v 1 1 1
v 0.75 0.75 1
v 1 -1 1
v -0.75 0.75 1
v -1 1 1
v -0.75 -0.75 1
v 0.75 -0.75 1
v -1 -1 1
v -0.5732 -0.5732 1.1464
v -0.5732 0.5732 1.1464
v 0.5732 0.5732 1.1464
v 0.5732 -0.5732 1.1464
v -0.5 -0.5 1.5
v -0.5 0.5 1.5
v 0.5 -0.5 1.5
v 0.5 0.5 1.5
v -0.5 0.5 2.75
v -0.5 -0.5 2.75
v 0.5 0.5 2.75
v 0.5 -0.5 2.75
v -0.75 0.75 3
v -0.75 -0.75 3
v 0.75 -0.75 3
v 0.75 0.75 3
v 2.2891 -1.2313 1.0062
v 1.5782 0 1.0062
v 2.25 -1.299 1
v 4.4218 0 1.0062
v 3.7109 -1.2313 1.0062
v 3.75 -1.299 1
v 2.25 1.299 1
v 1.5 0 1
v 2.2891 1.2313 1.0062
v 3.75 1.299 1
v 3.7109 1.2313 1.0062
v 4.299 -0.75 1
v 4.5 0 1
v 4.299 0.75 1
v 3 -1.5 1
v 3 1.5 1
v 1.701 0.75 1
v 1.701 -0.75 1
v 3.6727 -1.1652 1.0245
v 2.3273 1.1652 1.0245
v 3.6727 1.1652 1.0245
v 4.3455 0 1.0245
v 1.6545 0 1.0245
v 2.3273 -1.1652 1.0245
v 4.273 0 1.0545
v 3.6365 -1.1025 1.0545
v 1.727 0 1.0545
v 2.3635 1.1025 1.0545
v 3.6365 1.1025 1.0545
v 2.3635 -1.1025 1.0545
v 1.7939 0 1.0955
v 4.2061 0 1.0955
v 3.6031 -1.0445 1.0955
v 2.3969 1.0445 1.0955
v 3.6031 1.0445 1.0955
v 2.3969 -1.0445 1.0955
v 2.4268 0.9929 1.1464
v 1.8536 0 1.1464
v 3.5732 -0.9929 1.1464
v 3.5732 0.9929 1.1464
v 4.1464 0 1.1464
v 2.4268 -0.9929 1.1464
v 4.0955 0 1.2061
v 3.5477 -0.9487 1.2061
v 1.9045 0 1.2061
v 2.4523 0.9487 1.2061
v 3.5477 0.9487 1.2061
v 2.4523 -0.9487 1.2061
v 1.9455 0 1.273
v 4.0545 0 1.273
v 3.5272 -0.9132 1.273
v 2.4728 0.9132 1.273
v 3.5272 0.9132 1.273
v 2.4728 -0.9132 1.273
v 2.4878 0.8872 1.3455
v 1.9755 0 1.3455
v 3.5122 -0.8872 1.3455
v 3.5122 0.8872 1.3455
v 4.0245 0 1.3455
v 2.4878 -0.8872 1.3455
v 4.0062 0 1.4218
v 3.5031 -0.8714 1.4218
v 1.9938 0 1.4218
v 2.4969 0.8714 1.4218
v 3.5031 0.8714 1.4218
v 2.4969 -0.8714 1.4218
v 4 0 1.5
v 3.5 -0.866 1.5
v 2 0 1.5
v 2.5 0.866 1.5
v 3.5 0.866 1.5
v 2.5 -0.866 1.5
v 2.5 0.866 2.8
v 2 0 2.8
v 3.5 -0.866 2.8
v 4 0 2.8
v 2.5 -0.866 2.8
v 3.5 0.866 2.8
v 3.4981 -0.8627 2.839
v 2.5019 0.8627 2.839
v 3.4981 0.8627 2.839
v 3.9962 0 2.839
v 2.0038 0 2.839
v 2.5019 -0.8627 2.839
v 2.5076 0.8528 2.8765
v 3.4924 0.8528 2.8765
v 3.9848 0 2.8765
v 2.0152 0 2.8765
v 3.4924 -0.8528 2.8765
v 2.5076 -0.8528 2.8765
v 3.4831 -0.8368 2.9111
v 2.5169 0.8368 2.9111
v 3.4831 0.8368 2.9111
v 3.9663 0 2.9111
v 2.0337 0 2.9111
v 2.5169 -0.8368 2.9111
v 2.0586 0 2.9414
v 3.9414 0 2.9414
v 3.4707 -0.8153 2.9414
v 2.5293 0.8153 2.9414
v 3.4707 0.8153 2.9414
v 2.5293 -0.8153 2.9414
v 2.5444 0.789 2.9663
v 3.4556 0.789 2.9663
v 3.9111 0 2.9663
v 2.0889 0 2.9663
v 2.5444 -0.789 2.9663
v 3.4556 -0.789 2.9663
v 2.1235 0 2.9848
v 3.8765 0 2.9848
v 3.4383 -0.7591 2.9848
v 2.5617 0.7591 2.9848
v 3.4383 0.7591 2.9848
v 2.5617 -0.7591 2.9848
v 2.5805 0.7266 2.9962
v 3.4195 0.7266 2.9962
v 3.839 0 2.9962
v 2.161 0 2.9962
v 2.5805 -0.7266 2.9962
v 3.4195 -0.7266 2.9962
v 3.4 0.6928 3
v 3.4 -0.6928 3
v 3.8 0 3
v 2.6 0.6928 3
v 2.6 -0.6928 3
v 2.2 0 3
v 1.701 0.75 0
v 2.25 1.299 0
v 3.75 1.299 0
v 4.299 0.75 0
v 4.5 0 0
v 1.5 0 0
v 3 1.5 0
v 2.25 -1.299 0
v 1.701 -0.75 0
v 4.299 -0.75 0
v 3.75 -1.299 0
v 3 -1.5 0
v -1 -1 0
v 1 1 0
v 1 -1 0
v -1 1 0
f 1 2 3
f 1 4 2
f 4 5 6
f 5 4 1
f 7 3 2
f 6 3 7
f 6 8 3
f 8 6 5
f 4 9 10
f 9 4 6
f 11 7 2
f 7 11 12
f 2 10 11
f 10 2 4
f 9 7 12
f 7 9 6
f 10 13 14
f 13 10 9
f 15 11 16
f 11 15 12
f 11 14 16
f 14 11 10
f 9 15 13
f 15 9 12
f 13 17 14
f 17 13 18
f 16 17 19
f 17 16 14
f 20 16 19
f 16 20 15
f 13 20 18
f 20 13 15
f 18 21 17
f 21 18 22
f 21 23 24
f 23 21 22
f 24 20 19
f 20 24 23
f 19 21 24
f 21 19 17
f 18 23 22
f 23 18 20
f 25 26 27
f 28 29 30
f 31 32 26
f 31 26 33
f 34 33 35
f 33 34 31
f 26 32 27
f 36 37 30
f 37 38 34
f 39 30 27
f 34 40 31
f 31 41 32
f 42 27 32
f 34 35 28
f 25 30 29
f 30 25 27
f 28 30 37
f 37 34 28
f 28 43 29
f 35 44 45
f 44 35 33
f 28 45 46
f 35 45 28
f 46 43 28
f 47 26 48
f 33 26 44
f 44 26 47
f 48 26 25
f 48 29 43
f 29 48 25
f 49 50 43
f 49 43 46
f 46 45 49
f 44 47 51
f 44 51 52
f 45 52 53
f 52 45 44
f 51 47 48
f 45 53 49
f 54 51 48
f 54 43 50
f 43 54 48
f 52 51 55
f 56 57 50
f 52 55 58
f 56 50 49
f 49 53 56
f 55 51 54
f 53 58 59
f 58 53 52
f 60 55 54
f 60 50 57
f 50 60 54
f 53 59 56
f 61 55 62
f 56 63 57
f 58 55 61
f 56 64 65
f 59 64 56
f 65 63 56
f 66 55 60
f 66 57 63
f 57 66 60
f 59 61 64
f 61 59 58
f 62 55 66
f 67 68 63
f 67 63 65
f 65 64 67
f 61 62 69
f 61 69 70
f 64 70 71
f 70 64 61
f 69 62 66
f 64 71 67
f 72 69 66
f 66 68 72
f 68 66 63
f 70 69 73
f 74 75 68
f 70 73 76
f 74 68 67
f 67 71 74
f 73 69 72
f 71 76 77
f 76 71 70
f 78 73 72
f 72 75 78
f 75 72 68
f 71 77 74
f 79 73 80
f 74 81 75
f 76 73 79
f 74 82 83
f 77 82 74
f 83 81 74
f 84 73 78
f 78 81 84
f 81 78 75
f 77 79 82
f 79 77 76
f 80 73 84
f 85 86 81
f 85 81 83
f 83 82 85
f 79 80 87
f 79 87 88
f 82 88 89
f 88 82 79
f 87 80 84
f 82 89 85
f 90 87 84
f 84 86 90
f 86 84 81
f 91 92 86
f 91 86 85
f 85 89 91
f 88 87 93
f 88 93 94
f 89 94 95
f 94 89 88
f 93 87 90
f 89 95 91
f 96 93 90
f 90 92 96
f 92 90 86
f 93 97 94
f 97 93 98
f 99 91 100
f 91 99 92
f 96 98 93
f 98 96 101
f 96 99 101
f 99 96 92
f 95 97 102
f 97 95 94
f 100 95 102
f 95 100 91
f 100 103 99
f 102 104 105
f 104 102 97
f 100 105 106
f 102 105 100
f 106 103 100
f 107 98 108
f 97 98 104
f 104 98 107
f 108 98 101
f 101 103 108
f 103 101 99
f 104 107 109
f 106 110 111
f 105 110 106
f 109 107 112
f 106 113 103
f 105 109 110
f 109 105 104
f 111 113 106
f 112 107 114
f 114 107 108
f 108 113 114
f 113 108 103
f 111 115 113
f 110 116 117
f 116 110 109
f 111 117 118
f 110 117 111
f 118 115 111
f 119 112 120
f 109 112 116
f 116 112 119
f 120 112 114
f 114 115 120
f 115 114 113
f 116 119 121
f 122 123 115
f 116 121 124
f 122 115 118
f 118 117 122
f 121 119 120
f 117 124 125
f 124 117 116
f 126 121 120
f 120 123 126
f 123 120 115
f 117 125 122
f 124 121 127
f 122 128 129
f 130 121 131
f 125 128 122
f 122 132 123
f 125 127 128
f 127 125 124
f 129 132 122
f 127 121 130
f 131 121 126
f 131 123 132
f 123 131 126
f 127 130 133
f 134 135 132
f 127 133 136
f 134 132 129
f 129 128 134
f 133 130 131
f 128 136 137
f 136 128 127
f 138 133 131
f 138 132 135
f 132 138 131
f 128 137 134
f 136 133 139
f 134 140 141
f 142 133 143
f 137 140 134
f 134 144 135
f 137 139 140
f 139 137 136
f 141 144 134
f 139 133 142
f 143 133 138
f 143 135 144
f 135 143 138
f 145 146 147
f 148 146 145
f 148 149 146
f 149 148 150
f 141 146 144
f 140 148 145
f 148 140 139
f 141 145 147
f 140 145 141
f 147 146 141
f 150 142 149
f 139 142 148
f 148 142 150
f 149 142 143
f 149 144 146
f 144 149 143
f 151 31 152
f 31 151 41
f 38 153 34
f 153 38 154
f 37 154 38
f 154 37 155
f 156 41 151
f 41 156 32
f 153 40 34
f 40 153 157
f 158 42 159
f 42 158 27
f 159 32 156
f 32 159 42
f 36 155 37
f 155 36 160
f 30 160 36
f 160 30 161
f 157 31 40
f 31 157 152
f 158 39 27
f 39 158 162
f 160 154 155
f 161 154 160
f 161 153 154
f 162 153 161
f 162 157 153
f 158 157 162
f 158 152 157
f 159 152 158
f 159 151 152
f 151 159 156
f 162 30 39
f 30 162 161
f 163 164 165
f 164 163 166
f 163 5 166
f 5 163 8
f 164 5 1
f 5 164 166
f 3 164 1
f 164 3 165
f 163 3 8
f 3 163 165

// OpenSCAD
/*
fillet and bevel extrusion from 2d shapes using $fn circular steps between faces
v1.0.0
Pavan Dayal

example:
*/
linear_extrude(1) square(2, center=true);
translate([0,0,1]) fillet_extrude(1, 1.5, 0.5, $fn=2) square(1, center=true);
translate([0,0,2]) extrude_bevel(1, 1.5, 0.25, $fn=1) square(1, center=true);

translate([3,0,0]) {
    linear_extrude(1) circle(1.5, $fn=12);
    translate([0,0,1]) fillet_extrude(1, 1.5, 0.5, $fn=10) circle(1,  $fn=6);
    translate([0,0,2]) extrude_bevel(1, 0.8, 0.2, $fn=8) circle(1, $fn=6);
}


module fillet_extrude(extrude, fillet=1.1, fillet_height=0.1, $fn=8) {
    let (
        scale_curve = function(t, f) (1+f)-f*sin(t*90),
        height_curve = function(t, fh) fh-fh*cos(t*90)
    ) union() {
        for (j=[1:$fn]) let (
            t0 = (j-1)/$fn,
            t1 = j/$fn,
            scale0 = scale_curve(t0, fillet-1),
            scale1 = scale_curve(t1, fillet-1),
            height0 = height_curve(t0, fillet_height),
            height1 = height_curve(t1, fillet_height),
            delta_h = height1 - height0,
            factor_scale = scale1/scale0
        ) translate([0,0,height0])
            linear_extrude(delta_h, scale=factor_scale)
                scale([scale0, scale0, 1])
                    children();

        translate([0,0,fillet_height])
            linear_extrude(extrude-fillet_height)
                children();
    }
}

module extrude_bevel(extrude, bevel=0.9, bevel_height=0.1, $fn=8) {
    let (
        scale_curve = function(t, f) (1-f)+f*cos(t*90),
        height_curve = function(t, fh) extrude-fh + fh*sin(t*90)
    ) union() {
        linear_extrude(extrude-bevel_height) children();

        for (j=[1:$fn]) let (
            t0 = (j-1)/$fn,
            t1 = j/$fn,
            scale0 = scale_curve(t0, 1-bevel),
            scale1 = scale_curve(t1, 1-bevel),
            height0 = height_curve(t0, bevel_height),
            height1 = height_curve(t1, bevel_height),
            delta_h = height1 - height0,
            factor_scale = scale1/scale0
        ) translate([0,0,height0])
            linear_extrude(delta_h, scale=factor_scale)
                scale([scale0, scale0, 1])
                    children();
    }
}
